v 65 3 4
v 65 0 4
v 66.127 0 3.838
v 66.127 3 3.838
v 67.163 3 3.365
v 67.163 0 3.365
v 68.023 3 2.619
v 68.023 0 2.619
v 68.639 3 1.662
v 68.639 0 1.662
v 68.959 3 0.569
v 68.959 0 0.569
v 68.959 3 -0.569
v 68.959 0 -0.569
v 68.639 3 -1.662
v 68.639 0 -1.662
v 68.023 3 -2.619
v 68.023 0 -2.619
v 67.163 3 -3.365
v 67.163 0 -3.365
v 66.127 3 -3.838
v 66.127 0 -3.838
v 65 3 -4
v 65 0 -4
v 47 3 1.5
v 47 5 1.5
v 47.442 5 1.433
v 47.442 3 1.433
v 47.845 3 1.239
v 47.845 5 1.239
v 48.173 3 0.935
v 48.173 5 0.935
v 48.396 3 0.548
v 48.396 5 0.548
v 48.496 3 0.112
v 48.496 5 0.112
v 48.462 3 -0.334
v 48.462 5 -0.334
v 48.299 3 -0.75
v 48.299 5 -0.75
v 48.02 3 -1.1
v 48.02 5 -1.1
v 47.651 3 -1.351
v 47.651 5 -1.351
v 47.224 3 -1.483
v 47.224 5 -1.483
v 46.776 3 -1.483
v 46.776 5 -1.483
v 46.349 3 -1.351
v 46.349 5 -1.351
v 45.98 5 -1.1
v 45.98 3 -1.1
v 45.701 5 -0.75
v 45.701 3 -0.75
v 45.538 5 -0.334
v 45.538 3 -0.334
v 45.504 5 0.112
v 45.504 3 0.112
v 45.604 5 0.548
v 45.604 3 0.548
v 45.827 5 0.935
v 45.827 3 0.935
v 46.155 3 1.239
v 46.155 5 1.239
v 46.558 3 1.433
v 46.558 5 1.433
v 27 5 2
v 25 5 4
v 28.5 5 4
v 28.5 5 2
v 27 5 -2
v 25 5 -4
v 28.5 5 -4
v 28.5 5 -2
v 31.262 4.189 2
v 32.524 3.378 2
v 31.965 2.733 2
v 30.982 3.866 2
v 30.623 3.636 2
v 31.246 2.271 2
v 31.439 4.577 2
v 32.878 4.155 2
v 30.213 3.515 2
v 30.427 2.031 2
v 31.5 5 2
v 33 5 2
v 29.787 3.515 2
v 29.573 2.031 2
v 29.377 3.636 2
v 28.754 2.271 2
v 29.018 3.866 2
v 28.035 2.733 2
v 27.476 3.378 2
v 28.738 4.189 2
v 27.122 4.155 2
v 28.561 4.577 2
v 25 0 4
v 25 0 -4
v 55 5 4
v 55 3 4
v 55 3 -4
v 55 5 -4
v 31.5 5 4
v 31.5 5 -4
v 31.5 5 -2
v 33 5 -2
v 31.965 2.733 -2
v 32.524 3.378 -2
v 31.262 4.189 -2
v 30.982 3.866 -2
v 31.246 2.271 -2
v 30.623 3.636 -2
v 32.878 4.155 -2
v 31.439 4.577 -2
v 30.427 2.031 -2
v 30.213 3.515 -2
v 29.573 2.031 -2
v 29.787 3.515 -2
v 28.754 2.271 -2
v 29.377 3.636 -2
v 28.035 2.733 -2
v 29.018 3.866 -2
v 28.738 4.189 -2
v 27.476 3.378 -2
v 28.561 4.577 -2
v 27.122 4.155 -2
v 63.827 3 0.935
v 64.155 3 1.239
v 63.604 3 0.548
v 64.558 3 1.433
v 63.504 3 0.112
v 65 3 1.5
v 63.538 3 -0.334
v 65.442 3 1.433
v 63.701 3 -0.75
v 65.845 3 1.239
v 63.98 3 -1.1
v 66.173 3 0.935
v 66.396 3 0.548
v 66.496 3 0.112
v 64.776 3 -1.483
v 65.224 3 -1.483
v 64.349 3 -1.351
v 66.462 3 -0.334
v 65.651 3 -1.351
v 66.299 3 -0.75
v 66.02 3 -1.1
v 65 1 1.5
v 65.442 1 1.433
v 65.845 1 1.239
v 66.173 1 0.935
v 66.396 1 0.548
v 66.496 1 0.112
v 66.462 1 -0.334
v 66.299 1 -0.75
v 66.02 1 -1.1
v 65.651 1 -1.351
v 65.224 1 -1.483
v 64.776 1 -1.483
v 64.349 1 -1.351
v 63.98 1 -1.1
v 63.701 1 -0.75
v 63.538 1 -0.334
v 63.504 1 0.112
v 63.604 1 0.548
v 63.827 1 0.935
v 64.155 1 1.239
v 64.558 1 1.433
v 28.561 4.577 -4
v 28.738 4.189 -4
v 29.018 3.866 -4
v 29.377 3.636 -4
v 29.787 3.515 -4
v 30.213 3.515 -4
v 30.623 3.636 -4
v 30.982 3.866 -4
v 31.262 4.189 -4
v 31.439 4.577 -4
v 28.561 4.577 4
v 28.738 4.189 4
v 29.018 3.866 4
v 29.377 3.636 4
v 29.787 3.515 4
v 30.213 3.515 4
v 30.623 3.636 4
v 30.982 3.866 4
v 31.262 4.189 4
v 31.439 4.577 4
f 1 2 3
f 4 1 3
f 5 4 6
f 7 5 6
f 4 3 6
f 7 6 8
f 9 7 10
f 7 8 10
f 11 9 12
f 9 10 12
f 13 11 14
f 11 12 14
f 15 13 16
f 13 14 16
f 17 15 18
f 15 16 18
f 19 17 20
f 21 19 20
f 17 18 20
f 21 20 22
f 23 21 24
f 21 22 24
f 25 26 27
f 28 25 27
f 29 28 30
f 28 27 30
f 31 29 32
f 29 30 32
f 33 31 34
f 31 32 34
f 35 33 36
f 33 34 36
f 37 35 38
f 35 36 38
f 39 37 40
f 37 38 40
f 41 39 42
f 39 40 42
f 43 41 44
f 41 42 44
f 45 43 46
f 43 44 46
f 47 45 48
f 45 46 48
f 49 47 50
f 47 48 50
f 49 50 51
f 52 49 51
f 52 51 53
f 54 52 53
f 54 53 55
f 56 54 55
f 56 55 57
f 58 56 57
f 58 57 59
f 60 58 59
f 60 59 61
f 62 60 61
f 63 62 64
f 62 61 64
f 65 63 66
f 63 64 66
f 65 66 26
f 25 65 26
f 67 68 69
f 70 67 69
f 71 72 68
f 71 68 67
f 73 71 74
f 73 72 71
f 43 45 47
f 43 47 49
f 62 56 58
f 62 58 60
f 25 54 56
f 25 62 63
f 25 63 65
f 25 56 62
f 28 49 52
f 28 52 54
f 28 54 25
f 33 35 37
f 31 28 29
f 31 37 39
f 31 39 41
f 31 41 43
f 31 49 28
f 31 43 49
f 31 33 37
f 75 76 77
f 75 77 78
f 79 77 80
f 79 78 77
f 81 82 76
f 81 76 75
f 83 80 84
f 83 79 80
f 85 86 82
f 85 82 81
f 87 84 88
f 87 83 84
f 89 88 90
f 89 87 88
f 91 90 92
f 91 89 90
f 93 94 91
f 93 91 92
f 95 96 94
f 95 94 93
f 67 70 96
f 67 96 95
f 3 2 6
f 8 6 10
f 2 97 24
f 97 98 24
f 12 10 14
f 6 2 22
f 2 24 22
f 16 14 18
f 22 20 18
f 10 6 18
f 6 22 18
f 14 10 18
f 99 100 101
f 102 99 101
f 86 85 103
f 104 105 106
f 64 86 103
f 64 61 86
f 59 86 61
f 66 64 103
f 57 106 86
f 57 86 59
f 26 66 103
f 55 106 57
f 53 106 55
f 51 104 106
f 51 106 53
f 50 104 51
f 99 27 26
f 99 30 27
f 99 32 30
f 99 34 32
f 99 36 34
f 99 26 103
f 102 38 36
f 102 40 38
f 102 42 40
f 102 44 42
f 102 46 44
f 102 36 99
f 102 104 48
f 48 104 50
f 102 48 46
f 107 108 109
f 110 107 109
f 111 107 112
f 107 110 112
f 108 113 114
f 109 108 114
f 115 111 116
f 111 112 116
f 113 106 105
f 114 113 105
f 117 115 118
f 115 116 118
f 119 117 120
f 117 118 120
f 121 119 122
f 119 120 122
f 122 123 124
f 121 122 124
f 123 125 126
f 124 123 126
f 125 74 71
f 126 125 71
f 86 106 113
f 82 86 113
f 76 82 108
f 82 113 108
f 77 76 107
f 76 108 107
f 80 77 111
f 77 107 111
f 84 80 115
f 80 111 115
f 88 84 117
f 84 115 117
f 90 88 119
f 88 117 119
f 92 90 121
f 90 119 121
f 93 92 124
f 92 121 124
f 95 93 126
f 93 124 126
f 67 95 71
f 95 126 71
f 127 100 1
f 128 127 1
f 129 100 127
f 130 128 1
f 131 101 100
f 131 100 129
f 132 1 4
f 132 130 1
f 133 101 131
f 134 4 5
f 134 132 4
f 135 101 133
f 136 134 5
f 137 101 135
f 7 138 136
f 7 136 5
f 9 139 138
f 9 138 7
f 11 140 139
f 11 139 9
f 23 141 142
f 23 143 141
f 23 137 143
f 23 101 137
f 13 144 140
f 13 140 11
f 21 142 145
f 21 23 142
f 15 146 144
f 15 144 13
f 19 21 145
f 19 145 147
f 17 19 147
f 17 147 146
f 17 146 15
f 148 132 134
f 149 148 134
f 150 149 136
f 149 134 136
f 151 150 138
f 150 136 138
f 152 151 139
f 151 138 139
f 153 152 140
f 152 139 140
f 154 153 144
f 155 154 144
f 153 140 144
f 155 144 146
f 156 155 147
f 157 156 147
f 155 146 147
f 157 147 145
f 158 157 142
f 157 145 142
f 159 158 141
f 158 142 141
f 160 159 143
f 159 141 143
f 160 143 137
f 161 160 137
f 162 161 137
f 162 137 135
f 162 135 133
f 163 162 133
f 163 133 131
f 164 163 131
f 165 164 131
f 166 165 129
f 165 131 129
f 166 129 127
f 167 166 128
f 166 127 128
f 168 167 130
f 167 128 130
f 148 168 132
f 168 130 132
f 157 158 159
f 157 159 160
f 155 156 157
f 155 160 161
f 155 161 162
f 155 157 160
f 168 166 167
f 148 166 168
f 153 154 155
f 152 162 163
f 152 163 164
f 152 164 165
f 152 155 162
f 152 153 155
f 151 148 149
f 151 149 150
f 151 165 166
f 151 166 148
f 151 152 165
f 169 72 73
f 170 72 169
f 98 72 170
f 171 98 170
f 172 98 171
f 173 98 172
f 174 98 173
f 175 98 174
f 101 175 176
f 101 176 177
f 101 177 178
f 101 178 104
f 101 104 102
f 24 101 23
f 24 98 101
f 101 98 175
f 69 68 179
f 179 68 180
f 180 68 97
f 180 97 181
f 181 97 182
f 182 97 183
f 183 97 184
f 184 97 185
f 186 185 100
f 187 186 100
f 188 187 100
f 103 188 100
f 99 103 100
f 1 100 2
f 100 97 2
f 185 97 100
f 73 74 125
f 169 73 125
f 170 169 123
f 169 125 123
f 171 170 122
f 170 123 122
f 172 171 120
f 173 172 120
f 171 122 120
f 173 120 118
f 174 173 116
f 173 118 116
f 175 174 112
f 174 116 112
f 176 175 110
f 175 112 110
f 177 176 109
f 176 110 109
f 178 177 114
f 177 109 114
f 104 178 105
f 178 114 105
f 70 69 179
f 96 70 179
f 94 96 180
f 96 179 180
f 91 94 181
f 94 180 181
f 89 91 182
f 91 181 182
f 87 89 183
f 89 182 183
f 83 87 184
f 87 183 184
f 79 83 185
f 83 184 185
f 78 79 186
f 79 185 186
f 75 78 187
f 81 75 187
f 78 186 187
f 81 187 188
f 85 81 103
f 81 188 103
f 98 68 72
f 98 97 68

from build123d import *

# Parameters (mm, degrees)
BOSS_EXTRUDE2_DEPTH     = 3
SKETCH3_W               = 30
SKETCH3_H               = 8
BOSS_EXTRUDE3_DEPTH     = 2
CUT_EXTRUDE1_DEPTH      = 70.641941386
CUT_EXTRUDE2_DEPTH      = 2
CUT_EXTRUDE2_DEPTH_BACK = 2
SKETCH4_R               = 1.5
CUT_EXTRUDE3_DEPTH      = 2
SKETCH12_R              = 1.5
CUT_EXTRUDE4_DEPTH      = 2


with BuildPart() as part:
    # Sketch1 → Boss-Extrude2 (new body)
    with BuildSketch(Plane(origin=(0, 0, 0), x_dir=(1, 0, 0), z_dir=(0, 1, 0))):
        with BuildLine():
            Line((25, -4), (65, -4))
            ThreePointArc((65, -4), (69, 0), (65, 4))
            Line((65, 4), (25, 4))
            Line((25, 4), (25, -4))
        make_face()
    extrude(amount=BOSS_EXTRUDE2_DEPTH)

    # Sketch3 → Boss-Extrude3 (add)
    with BuildSketch(Plane(origin=(0, 3, 0), x_dir=(1, 0, 0), z_dir=(0, 1, 0))):
        with Locations((40, 0)):
            Rectangle(SKETCH3_W, SKETCH3_H)
    extrude(amount=BOSS_EXTRUDE3_DEPTH)

    # Sketch13 → Cut-Extrude1 (cut, through all)
    with BuildSketch(Plane.XY.offset(4)):
        with BuildLine():
            Line((31.5, 5), (28.5, 5))
            ThreePointArc((28.5, 5), (30, 3.5), (31.5, 5))
        make_face()
    extrude(amount=-CUT_EXTRUDE1_DEPTH, mode=Mode.SUBTRACT)

    # Sketch14 → Cut-Extrude2 (cut, two sides: drawn at the far end of the back side and taken through both)
    with BuildSketch(Plane.XY.offset(-CUT_EXTRUDE2_DEPTH_BACK)):
        with BuildLine():
            Line((27, 5), (33, 5))
            ThreePointArc((33, 5), (30, 2), (27, 5))
        make_face()
    extrude(amount=CUT_EXTRUDE2_DEPTH + CUT_EXTRUDE2_DEPTH_BACK, mode=Mode.SUBTRACT)

    # Sketch4 → Cut-Extrude3 (cut)
    with BuildSketch(Plane(origin=(0, 3, 0), x_dir=(1, 0, 0), z_dir=(0, 1, 0))):
        with Locations(Location((65, 0, 0), (0, 0, 270))):
            Circle(SKETCH4_R)
    extrude(amount=-CUT_EXTRUDE3_DEPTH, mode=Mode.SUBTRACT)

    # Sketch12 → Cut-Extrude4 (cut)
    with BuildSketch(Plane(origin=(0, 5, 0), x_dir=(1, 0, 0), z_dir=(0, 1, 0))):
        with Locations(Location((47, 0, 0), (0, 0, 270))):
            Circle(SKETCH12_R)
    extrude(amount=-CUT_EXTRUDE4_DEPTH, mode=Mode.SUBTRACT)


solid = part.part
